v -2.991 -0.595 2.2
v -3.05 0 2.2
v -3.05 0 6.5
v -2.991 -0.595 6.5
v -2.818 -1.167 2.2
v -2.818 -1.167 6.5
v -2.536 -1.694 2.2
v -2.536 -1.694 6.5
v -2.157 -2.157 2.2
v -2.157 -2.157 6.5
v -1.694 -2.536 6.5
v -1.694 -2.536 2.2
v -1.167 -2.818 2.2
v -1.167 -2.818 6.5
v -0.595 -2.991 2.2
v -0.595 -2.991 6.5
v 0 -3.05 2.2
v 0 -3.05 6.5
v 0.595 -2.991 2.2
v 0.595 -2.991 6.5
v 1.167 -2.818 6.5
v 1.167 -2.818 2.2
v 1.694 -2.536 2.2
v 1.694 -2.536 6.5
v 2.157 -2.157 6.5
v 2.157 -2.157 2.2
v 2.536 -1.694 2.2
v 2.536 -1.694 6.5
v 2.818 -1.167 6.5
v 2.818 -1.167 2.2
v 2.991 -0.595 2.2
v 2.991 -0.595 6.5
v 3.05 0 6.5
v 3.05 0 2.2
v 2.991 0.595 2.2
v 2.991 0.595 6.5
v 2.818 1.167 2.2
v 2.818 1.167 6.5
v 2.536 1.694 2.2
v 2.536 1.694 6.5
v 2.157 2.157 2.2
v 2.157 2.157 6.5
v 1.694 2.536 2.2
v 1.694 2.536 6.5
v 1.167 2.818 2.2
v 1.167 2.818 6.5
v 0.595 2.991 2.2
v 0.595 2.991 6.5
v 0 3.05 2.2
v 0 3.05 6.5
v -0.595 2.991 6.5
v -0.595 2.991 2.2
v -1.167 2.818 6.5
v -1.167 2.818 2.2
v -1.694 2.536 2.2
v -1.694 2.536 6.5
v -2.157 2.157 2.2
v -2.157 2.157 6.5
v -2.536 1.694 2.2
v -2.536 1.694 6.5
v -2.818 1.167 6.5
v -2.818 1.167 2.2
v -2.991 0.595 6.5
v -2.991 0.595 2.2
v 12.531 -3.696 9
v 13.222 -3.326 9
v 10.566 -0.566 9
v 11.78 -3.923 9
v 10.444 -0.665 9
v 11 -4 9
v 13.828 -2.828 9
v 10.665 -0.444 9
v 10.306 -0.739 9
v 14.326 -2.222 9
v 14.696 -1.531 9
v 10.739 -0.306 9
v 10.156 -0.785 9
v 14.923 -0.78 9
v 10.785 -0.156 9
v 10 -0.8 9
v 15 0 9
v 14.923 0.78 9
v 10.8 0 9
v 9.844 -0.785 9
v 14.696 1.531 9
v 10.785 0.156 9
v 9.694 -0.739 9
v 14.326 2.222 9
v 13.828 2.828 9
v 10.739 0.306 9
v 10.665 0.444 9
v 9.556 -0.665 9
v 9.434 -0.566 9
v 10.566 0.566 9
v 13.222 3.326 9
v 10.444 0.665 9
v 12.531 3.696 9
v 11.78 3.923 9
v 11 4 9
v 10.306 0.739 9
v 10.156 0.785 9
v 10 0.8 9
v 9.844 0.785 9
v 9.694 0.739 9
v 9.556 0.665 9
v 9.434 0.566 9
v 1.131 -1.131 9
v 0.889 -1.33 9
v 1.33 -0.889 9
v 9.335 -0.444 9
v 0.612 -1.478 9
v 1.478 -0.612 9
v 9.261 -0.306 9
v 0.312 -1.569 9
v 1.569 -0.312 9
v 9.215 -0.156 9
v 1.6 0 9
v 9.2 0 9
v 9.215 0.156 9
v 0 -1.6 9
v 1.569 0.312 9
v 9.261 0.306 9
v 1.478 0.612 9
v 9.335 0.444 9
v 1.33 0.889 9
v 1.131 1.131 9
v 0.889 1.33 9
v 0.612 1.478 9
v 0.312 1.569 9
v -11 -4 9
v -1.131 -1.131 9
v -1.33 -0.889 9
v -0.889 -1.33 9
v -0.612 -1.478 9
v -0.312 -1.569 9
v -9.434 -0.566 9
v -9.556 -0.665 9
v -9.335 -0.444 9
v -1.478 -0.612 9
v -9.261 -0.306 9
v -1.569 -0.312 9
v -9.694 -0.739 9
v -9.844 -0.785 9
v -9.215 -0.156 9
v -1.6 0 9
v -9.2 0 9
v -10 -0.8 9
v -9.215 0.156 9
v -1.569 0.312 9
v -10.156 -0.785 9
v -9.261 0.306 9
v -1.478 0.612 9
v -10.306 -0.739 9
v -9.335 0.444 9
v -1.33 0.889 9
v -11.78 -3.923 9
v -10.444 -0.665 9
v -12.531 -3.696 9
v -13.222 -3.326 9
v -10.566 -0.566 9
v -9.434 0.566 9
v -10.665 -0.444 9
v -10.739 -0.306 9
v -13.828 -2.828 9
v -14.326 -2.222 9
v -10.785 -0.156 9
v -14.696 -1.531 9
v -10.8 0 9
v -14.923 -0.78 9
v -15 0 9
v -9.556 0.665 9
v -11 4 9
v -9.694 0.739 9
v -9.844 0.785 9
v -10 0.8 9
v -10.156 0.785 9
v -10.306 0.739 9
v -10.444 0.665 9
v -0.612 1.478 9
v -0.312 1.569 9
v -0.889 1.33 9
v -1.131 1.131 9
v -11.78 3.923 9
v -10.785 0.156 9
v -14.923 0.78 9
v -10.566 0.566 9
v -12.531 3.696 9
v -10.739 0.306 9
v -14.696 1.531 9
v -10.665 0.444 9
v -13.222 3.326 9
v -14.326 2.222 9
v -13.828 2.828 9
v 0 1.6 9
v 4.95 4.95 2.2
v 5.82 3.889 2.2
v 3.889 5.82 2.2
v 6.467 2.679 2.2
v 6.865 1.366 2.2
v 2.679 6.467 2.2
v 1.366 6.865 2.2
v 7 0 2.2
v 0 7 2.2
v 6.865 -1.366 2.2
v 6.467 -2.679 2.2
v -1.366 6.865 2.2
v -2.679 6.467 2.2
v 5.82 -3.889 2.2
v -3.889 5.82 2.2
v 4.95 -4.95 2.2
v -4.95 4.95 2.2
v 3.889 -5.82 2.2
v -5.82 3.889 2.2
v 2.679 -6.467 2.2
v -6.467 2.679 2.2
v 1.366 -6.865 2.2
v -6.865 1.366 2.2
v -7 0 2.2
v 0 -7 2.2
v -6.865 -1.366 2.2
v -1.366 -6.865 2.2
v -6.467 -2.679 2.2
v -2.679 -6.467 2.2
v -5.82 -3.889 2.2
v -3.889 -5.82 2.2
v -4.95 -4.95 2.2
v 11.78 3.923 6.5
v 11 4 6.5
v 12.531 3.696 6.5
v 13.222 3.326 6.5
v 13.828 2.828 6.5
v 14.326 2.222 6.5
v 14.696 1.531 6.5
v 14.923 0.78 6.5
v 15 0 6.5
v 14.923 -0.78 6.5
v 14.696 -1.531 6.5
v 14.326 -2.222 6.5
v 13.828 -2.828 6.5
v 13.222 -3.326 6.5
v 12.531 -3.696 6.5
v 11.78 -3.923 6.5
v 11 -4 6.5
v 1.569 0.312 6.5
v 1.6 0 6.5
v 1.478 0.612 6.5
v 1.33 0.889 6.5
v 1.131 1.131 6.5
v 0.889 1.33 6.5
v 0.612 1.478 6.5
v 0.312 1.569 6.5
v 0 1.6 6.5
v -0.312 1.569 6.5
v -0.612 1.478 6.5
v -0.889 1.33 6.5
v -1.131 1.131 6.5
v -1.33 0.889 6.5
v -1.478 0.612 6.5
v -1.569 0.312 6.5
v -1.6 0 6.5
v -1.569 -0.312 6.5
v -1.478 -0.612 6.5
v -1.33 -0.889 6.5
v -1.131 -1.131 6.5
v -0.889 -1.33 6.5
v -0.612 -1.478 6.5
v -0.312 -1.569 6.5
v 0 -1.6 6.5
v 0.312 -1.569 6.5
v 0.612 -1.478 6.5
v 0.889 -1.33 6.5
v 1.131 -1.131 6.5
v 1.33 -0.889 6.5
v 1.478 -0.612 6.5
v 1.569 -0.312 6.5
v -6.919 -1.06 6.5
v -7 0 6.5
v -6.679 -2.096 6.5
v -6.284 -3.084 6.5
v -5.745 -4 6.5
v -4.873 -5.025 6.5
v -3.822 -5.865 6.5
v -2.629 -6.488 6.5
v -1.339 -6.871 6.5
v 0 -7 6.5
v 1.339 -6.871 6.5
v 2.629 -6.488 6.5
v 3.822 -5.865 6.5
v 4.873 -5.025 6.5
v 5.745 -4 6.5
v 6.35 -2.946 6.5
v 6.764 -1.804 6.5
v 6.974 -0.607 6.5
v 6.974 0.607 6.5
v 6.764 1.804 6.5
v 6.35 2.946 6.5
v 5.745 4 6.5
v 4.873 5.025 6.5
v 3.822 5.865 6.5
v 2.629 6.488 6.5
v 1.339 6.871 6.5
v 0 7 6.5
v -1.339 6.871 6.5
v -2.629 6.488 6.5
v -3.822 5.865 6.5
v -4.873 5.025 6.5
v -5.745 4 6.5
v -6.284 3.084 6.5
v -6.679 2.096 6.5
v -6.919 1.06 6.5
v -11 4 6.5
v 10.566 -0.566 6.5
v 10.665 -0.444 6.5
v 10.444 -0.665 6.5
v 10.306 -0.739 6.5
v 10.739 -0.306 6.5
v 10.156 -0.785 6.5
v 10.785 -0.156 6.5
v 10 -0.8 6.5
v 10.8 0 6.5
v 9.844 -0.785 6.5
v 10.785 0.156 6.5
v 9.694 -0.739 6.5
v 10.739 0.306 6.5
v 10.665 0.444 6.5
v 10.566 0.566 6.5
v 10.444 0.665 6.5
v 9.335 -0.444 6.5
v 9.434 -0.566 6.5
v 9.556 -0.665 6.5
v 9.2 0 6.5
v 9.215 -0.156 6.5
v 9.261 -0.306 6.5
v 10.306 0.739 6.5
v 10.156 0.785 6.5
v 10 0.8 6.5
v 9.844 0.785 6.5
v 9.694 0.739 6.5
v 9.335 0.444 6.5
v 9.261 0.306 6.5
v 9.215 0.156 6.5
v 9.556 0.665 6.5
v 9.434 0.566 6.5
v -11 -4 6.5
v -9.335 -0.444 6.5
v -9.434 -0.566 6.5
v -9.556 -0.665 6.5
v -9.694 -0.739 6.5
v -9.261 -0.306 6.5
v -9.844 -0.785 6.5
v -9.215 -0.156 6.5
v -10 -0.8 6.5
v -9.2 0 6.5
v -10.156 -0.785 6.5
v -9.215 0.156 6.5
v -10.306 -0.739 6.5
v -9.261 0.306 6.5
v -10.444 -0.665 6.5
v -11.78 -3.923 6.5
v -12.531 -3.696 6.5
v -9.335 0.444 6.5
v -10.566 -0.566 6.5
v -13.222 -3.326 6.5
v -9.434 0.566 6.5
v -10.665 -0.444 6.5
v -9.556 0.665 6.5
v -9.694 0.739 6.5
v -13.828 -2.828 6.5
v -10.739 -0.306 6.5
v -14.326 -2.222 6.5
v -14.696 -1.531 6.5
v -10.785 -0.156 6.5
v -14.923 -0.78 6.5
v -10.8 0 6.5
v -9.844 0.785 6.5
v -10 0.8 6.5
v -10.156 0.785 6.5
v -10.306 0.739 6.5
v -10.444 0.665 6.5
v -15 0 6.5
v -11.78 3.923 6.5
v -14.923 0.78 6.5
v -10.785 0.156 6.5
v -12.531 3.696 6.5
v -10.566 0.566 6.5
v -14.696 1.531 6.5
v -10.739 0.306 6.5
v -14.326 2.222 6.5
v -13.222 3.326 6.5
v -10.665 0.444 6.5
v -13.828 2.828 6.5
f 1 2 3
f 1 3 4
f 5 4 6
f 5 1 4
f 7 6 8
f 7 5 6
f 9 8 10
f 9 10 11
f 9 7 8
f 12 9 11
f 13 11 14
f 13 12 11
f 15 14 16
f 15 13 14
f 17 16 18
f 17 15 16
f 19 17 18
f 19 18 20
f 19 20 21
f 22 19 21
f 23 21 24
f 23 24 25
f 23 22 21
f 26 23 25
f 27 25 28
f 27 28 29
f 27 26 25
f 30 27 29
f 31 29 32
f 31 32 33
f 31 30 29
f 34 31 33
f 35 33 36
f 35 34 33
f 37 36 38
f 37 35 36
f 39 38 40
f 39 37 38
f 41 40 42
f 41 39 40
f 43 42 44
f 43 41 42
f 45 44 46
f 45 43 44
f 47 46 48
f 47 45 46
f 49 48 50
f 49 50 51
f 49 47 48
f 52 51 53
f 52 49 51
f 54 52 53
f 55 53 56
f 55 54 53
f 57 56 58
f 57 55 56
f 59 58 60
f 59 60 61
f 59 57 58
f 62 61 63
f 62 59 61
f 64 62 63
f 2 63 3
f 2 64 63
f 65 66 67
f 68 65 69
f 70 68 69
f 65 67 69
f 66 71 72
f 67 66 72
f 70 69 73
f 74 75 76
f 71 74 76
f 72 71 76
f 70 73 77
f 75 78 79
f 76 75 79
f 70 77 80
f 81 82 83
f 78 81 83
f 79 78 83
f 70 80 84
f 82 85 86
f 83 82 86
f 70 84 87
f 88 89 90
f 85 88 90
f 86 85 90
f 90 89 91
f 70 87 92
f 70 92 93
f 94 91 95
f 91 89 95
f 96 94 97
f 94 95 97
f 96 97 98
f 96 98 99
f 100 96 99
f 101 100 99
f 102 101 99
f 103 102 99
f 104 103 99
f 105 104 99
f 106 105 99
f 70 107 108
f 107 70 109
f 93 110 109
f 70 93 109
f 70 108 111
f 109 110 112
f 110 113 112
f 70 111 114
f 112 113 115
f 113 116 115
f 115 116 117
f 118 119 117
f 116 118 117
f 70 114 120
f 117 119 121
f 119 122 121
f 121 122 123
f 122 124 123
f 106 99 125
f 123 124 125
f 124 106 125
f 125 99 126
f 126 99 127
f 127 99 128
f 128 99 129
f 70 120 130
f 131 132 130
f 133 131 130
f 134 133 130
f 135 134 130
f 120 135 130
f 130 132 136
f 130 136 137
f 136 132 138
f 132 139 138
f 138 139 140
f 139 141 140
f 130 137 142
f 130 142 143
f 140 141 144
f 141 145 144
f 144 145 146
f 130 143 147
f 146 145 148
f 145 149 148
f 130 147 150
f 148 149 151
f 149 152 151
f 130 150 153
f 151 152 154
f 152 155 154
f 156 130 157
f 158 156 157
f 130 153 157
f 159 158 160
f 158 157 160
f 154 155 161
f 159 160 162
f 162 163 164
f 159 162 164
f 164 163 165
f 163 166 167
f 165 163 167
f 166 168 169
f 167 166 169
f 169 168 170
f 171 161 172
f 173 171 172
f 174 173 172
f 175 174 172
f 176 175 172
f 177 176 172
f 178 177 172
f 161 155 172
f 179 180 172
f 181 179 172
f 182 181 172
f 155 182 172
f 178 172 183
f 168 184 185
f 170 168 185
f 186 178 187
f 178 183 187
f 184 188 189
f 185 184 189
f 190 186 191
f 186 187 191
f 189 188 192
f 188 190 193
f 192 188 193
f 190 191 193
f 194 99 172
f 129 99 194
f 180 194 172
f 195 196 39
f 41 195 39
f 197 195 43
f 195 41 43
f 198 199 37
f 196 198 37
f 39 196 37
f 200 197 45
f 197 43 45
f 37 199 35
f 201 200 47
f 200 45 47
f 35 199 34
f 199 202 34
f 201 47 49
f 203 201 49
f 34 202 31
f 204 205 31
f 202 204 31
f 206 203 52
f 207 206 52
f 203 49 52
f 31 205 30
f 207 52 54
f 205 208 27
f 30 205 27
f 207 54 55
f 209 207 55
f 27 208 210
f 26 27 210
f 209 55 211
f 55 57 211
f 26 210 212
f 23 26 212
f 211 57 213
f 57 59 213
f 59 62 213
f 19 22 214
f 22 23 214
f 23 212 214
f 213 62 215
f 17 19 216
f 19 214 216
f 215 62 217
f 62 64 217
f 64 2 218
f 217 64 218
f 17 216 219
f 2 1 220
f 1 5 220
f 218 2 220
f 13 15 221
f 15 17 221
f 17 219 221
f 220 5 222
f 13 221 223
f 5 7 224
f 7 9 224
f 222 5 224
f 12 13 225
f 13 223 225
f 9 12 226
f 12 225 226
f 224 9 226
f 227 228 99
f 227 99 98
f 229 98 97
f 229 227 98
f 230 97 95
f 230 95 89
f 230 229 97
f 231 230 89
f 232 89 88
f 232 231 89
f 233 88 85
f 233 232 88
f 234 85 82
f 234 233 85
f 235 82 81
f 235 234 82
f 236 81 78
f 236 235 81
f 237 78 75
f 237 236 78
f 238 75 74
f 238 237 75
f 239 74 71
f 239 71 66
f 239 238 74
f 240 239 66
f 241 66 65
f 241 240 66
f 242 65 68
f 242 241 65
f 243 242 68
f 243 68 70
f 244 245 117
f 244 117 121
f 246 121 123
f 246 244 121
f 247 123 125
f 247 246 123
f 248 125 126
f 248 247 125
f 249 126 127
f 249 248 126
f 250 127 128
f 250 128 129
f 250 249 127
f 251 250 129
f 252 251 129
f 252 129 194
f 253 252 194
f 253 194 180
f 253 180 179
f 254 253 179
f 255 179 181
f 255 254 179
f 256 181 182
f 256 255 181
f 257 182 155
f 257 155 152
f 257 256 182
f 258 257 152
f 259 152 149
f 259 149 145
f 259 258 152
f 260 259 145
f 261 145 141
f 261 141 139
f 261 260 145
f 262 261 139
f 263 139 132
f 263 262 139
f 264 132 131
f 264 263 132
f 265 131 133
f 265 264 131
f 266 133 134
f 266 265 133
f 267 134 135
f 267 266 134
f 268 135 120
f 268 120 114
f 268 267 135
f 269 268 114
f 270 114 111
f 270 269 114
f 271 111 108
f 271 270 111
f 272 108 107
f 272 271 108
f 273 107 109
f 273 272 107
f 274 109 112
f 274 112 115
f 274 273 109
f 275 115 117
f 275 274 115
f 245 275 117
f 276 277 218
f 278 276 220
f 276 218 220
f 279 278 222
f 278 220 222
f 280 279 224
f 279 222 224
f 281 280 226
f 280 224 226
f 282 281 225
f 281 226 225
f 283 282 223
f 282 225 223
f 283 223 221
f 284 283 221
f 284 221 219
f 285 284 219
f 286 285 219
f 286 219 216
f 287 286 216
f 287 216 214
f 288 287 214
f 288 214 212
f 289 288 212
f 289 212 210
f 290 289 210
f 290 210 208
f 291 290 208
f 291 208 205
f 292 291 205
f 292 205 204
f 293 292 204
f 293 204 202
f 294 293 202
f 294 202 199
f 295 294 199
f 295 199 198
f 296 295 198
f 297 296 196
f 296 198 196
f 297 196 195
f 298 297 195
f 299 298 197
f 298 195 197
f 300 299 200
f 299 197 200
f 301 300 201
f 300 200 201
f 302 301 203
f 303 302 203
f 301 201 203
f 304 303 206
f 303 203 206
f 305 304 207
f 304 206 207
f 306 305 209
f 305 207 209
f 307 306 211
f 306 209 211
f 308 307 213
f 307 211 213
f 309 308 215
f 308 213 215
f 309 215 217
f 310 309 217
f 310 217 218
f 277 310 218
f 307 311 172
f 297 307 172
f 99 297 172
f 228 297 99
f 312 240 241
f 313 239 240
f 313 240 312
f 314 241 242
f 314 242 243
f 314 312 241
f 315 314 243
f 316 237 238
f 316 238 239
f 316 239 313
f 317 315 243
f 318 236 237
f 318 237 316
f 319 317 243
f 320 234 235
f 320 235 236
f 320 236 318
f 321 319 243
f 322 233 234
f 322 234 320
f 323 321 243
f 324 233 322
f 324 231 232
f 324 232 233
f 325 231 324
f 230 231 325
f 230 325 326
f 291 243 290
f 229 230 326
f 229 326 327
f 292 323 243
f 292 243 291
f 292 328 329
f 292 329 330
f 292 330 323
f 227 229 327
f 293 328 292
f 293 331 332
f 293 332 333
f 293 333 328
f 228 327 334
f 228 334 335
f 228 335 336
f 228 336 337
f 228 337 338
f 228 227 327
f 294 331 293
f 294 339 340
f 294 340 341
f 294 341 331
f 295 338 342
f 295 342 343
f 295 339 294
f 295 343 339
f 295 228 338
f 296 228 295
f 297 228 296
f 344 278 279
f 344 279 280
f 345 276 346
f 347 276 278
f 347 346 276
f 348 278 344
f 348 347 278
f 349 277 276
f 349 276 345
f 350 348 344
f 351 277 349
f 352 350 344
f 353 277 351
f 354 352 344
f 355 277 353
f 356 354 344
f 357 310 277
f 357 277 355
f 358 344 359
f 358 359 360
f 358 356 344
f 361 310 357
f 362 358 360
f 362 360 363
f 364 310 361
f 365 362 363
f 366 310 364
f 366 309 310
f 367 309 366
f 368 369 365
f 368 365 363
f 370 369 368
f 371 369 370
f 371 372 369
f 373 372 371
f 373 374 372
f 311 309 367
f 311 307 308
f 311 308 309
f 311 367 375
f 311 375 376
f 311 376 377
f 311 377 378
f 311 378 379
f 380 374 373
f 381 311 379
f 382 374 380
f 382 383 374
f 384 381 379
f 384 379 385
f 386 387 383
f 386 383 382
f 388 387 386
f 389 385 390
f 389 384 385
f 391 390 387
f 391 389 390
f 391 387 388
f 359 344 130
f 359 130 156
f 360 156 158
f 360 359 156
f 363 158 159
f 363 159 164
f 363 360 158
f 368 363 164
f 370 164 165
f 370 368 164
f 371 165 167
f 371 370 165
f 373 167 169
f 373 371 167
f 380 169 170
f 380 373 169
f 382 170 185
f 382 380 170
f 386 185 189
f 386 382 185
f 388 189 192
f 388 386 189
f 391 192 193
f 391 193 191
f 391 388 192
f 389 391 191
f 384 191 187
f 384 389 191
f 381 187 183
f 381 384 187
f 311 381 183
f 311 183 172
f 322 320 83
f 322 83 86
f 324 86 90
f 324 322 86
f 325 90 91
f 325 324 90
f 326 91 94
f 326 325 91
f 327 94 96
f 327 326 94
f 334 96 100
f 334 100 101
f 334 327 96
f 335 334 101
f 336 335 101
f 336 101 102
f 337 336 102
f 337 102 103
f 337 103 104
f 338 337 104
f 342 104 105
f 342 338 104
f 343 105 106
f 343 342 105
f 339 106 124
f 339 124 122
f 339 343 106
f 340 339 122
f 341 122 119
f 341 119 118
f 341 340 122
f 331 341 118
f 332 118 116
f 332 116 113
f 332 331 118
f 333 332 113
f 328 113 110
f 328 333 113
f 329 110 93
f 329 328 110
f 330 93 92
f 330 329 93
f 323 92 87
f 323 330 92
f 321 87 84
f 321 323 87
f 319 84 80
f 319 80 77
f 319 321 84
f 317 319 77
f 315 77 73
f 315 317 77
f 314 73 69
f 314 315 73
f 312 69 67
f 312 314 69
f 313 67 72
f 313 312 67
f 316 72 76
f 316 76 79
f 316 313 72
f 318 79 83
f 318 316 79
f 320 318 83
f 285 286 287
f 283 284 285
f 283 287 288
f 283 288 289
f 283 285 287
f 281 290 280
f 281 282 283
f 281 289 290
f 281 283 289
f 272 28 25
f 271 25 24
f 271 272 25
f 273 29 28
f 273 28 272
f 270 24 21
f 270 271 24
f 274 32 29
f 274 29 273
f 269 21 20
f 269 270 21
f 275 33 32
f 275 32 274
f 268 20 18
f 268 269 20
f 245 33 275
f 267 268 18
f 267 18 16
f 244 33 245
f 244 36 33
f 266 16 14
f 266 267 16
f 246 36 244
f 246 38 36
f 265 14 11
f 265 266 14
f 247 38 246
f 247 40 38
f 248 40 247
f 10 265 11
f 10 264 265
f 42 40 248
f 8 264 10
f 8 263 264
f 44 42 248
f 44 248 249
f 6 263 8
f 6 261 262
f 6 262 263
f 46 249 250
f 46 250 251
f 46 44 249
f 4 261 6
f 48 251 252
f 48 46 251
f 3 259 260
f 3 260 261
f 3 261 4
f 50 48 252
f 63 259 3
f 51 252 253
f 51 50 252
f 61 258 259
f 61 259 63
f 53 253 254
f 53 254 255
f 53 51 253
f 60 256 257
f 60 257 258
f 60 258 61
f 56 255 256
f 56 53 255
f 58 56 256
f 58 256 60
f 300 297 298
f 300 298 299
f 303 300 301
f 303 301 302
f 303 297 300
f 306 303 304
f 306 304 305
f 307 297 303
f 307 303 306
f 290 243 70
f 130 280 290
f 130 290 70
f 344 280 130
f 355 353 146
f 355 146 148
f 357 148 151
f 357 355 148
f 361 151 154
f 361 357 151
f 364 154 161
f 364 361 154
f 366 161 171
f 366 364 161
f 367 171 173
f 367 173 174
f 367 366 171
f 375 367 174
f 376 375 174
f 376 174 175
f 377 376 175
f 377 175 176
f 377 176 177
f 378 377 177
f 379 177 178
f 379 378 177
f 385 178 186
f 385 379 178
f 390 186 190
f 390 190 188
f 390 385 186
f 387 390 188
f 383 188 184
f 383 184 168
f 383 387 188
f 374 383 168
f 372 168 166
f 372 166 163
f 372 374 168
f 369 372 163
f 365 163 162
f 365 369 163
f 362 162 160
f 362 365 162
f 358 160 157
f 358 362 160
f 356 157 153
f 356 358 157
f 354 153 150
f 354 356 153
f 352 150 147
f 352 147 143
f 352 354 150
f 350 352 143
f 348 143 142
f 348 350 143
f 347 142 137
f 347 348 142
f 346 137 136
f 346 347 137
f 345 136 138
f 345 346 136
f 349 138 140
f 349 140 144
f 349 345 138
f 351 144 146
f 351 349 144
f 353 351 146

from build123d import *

# Parameters (mm, degrees)
HUB_START   = 2.2
SKETCH1_R   = 7
SKETCH1_R_2 = 3.05
HUB_DEPTH   = 4.3
ARM_START   = 6.5
SKETCH2_R   = 1.6
SKETCH2_R_2 = 0.8
ARM_DEPTH   = 2.5


with BuildPart() as part:
    # Sketch1 → Hub (new body)
    with BuildSketch(Plane.XY.offset(HUB_START)):
        with Locations(Location((0, 0, 0), (0, 0, 180))):
            Circle(SKETCH1_R)
        with Locations(Location((0, 0, 0), (0, 0, 180))):
            Circle(SKETCH1_R_2, mode=Mode.SUBTRACT)
    extrude(amount=HUB_DEPTH)

    # Sketch2 → Arm (add)
    with BuildSketch(Plane.XY.offset(ARM_START)):
        with BuildLine():
            Line((-11, 4), (11, 4))
            ThreePointArc((11, 4), (15, 0), (11, -4))
            Line((11, -4), (-11, -4))
            ThreePointArc((-11, -4), (-15, 0), (-11, 4))
        make_face()
        Circle(SKETCH2_R, mode=Mode.SUBTRACT)
        with Locations((-10, 0)):
            Circle(SKETCH2_R_2, mode=Mode.SUBTRACT)
        with Locations((10, 0)):
            Circle(SKETCH2_R_2, mode=Mode.SUBTRACT)
    extrude(amount=ARM_DEPTH)


solid = part.part
